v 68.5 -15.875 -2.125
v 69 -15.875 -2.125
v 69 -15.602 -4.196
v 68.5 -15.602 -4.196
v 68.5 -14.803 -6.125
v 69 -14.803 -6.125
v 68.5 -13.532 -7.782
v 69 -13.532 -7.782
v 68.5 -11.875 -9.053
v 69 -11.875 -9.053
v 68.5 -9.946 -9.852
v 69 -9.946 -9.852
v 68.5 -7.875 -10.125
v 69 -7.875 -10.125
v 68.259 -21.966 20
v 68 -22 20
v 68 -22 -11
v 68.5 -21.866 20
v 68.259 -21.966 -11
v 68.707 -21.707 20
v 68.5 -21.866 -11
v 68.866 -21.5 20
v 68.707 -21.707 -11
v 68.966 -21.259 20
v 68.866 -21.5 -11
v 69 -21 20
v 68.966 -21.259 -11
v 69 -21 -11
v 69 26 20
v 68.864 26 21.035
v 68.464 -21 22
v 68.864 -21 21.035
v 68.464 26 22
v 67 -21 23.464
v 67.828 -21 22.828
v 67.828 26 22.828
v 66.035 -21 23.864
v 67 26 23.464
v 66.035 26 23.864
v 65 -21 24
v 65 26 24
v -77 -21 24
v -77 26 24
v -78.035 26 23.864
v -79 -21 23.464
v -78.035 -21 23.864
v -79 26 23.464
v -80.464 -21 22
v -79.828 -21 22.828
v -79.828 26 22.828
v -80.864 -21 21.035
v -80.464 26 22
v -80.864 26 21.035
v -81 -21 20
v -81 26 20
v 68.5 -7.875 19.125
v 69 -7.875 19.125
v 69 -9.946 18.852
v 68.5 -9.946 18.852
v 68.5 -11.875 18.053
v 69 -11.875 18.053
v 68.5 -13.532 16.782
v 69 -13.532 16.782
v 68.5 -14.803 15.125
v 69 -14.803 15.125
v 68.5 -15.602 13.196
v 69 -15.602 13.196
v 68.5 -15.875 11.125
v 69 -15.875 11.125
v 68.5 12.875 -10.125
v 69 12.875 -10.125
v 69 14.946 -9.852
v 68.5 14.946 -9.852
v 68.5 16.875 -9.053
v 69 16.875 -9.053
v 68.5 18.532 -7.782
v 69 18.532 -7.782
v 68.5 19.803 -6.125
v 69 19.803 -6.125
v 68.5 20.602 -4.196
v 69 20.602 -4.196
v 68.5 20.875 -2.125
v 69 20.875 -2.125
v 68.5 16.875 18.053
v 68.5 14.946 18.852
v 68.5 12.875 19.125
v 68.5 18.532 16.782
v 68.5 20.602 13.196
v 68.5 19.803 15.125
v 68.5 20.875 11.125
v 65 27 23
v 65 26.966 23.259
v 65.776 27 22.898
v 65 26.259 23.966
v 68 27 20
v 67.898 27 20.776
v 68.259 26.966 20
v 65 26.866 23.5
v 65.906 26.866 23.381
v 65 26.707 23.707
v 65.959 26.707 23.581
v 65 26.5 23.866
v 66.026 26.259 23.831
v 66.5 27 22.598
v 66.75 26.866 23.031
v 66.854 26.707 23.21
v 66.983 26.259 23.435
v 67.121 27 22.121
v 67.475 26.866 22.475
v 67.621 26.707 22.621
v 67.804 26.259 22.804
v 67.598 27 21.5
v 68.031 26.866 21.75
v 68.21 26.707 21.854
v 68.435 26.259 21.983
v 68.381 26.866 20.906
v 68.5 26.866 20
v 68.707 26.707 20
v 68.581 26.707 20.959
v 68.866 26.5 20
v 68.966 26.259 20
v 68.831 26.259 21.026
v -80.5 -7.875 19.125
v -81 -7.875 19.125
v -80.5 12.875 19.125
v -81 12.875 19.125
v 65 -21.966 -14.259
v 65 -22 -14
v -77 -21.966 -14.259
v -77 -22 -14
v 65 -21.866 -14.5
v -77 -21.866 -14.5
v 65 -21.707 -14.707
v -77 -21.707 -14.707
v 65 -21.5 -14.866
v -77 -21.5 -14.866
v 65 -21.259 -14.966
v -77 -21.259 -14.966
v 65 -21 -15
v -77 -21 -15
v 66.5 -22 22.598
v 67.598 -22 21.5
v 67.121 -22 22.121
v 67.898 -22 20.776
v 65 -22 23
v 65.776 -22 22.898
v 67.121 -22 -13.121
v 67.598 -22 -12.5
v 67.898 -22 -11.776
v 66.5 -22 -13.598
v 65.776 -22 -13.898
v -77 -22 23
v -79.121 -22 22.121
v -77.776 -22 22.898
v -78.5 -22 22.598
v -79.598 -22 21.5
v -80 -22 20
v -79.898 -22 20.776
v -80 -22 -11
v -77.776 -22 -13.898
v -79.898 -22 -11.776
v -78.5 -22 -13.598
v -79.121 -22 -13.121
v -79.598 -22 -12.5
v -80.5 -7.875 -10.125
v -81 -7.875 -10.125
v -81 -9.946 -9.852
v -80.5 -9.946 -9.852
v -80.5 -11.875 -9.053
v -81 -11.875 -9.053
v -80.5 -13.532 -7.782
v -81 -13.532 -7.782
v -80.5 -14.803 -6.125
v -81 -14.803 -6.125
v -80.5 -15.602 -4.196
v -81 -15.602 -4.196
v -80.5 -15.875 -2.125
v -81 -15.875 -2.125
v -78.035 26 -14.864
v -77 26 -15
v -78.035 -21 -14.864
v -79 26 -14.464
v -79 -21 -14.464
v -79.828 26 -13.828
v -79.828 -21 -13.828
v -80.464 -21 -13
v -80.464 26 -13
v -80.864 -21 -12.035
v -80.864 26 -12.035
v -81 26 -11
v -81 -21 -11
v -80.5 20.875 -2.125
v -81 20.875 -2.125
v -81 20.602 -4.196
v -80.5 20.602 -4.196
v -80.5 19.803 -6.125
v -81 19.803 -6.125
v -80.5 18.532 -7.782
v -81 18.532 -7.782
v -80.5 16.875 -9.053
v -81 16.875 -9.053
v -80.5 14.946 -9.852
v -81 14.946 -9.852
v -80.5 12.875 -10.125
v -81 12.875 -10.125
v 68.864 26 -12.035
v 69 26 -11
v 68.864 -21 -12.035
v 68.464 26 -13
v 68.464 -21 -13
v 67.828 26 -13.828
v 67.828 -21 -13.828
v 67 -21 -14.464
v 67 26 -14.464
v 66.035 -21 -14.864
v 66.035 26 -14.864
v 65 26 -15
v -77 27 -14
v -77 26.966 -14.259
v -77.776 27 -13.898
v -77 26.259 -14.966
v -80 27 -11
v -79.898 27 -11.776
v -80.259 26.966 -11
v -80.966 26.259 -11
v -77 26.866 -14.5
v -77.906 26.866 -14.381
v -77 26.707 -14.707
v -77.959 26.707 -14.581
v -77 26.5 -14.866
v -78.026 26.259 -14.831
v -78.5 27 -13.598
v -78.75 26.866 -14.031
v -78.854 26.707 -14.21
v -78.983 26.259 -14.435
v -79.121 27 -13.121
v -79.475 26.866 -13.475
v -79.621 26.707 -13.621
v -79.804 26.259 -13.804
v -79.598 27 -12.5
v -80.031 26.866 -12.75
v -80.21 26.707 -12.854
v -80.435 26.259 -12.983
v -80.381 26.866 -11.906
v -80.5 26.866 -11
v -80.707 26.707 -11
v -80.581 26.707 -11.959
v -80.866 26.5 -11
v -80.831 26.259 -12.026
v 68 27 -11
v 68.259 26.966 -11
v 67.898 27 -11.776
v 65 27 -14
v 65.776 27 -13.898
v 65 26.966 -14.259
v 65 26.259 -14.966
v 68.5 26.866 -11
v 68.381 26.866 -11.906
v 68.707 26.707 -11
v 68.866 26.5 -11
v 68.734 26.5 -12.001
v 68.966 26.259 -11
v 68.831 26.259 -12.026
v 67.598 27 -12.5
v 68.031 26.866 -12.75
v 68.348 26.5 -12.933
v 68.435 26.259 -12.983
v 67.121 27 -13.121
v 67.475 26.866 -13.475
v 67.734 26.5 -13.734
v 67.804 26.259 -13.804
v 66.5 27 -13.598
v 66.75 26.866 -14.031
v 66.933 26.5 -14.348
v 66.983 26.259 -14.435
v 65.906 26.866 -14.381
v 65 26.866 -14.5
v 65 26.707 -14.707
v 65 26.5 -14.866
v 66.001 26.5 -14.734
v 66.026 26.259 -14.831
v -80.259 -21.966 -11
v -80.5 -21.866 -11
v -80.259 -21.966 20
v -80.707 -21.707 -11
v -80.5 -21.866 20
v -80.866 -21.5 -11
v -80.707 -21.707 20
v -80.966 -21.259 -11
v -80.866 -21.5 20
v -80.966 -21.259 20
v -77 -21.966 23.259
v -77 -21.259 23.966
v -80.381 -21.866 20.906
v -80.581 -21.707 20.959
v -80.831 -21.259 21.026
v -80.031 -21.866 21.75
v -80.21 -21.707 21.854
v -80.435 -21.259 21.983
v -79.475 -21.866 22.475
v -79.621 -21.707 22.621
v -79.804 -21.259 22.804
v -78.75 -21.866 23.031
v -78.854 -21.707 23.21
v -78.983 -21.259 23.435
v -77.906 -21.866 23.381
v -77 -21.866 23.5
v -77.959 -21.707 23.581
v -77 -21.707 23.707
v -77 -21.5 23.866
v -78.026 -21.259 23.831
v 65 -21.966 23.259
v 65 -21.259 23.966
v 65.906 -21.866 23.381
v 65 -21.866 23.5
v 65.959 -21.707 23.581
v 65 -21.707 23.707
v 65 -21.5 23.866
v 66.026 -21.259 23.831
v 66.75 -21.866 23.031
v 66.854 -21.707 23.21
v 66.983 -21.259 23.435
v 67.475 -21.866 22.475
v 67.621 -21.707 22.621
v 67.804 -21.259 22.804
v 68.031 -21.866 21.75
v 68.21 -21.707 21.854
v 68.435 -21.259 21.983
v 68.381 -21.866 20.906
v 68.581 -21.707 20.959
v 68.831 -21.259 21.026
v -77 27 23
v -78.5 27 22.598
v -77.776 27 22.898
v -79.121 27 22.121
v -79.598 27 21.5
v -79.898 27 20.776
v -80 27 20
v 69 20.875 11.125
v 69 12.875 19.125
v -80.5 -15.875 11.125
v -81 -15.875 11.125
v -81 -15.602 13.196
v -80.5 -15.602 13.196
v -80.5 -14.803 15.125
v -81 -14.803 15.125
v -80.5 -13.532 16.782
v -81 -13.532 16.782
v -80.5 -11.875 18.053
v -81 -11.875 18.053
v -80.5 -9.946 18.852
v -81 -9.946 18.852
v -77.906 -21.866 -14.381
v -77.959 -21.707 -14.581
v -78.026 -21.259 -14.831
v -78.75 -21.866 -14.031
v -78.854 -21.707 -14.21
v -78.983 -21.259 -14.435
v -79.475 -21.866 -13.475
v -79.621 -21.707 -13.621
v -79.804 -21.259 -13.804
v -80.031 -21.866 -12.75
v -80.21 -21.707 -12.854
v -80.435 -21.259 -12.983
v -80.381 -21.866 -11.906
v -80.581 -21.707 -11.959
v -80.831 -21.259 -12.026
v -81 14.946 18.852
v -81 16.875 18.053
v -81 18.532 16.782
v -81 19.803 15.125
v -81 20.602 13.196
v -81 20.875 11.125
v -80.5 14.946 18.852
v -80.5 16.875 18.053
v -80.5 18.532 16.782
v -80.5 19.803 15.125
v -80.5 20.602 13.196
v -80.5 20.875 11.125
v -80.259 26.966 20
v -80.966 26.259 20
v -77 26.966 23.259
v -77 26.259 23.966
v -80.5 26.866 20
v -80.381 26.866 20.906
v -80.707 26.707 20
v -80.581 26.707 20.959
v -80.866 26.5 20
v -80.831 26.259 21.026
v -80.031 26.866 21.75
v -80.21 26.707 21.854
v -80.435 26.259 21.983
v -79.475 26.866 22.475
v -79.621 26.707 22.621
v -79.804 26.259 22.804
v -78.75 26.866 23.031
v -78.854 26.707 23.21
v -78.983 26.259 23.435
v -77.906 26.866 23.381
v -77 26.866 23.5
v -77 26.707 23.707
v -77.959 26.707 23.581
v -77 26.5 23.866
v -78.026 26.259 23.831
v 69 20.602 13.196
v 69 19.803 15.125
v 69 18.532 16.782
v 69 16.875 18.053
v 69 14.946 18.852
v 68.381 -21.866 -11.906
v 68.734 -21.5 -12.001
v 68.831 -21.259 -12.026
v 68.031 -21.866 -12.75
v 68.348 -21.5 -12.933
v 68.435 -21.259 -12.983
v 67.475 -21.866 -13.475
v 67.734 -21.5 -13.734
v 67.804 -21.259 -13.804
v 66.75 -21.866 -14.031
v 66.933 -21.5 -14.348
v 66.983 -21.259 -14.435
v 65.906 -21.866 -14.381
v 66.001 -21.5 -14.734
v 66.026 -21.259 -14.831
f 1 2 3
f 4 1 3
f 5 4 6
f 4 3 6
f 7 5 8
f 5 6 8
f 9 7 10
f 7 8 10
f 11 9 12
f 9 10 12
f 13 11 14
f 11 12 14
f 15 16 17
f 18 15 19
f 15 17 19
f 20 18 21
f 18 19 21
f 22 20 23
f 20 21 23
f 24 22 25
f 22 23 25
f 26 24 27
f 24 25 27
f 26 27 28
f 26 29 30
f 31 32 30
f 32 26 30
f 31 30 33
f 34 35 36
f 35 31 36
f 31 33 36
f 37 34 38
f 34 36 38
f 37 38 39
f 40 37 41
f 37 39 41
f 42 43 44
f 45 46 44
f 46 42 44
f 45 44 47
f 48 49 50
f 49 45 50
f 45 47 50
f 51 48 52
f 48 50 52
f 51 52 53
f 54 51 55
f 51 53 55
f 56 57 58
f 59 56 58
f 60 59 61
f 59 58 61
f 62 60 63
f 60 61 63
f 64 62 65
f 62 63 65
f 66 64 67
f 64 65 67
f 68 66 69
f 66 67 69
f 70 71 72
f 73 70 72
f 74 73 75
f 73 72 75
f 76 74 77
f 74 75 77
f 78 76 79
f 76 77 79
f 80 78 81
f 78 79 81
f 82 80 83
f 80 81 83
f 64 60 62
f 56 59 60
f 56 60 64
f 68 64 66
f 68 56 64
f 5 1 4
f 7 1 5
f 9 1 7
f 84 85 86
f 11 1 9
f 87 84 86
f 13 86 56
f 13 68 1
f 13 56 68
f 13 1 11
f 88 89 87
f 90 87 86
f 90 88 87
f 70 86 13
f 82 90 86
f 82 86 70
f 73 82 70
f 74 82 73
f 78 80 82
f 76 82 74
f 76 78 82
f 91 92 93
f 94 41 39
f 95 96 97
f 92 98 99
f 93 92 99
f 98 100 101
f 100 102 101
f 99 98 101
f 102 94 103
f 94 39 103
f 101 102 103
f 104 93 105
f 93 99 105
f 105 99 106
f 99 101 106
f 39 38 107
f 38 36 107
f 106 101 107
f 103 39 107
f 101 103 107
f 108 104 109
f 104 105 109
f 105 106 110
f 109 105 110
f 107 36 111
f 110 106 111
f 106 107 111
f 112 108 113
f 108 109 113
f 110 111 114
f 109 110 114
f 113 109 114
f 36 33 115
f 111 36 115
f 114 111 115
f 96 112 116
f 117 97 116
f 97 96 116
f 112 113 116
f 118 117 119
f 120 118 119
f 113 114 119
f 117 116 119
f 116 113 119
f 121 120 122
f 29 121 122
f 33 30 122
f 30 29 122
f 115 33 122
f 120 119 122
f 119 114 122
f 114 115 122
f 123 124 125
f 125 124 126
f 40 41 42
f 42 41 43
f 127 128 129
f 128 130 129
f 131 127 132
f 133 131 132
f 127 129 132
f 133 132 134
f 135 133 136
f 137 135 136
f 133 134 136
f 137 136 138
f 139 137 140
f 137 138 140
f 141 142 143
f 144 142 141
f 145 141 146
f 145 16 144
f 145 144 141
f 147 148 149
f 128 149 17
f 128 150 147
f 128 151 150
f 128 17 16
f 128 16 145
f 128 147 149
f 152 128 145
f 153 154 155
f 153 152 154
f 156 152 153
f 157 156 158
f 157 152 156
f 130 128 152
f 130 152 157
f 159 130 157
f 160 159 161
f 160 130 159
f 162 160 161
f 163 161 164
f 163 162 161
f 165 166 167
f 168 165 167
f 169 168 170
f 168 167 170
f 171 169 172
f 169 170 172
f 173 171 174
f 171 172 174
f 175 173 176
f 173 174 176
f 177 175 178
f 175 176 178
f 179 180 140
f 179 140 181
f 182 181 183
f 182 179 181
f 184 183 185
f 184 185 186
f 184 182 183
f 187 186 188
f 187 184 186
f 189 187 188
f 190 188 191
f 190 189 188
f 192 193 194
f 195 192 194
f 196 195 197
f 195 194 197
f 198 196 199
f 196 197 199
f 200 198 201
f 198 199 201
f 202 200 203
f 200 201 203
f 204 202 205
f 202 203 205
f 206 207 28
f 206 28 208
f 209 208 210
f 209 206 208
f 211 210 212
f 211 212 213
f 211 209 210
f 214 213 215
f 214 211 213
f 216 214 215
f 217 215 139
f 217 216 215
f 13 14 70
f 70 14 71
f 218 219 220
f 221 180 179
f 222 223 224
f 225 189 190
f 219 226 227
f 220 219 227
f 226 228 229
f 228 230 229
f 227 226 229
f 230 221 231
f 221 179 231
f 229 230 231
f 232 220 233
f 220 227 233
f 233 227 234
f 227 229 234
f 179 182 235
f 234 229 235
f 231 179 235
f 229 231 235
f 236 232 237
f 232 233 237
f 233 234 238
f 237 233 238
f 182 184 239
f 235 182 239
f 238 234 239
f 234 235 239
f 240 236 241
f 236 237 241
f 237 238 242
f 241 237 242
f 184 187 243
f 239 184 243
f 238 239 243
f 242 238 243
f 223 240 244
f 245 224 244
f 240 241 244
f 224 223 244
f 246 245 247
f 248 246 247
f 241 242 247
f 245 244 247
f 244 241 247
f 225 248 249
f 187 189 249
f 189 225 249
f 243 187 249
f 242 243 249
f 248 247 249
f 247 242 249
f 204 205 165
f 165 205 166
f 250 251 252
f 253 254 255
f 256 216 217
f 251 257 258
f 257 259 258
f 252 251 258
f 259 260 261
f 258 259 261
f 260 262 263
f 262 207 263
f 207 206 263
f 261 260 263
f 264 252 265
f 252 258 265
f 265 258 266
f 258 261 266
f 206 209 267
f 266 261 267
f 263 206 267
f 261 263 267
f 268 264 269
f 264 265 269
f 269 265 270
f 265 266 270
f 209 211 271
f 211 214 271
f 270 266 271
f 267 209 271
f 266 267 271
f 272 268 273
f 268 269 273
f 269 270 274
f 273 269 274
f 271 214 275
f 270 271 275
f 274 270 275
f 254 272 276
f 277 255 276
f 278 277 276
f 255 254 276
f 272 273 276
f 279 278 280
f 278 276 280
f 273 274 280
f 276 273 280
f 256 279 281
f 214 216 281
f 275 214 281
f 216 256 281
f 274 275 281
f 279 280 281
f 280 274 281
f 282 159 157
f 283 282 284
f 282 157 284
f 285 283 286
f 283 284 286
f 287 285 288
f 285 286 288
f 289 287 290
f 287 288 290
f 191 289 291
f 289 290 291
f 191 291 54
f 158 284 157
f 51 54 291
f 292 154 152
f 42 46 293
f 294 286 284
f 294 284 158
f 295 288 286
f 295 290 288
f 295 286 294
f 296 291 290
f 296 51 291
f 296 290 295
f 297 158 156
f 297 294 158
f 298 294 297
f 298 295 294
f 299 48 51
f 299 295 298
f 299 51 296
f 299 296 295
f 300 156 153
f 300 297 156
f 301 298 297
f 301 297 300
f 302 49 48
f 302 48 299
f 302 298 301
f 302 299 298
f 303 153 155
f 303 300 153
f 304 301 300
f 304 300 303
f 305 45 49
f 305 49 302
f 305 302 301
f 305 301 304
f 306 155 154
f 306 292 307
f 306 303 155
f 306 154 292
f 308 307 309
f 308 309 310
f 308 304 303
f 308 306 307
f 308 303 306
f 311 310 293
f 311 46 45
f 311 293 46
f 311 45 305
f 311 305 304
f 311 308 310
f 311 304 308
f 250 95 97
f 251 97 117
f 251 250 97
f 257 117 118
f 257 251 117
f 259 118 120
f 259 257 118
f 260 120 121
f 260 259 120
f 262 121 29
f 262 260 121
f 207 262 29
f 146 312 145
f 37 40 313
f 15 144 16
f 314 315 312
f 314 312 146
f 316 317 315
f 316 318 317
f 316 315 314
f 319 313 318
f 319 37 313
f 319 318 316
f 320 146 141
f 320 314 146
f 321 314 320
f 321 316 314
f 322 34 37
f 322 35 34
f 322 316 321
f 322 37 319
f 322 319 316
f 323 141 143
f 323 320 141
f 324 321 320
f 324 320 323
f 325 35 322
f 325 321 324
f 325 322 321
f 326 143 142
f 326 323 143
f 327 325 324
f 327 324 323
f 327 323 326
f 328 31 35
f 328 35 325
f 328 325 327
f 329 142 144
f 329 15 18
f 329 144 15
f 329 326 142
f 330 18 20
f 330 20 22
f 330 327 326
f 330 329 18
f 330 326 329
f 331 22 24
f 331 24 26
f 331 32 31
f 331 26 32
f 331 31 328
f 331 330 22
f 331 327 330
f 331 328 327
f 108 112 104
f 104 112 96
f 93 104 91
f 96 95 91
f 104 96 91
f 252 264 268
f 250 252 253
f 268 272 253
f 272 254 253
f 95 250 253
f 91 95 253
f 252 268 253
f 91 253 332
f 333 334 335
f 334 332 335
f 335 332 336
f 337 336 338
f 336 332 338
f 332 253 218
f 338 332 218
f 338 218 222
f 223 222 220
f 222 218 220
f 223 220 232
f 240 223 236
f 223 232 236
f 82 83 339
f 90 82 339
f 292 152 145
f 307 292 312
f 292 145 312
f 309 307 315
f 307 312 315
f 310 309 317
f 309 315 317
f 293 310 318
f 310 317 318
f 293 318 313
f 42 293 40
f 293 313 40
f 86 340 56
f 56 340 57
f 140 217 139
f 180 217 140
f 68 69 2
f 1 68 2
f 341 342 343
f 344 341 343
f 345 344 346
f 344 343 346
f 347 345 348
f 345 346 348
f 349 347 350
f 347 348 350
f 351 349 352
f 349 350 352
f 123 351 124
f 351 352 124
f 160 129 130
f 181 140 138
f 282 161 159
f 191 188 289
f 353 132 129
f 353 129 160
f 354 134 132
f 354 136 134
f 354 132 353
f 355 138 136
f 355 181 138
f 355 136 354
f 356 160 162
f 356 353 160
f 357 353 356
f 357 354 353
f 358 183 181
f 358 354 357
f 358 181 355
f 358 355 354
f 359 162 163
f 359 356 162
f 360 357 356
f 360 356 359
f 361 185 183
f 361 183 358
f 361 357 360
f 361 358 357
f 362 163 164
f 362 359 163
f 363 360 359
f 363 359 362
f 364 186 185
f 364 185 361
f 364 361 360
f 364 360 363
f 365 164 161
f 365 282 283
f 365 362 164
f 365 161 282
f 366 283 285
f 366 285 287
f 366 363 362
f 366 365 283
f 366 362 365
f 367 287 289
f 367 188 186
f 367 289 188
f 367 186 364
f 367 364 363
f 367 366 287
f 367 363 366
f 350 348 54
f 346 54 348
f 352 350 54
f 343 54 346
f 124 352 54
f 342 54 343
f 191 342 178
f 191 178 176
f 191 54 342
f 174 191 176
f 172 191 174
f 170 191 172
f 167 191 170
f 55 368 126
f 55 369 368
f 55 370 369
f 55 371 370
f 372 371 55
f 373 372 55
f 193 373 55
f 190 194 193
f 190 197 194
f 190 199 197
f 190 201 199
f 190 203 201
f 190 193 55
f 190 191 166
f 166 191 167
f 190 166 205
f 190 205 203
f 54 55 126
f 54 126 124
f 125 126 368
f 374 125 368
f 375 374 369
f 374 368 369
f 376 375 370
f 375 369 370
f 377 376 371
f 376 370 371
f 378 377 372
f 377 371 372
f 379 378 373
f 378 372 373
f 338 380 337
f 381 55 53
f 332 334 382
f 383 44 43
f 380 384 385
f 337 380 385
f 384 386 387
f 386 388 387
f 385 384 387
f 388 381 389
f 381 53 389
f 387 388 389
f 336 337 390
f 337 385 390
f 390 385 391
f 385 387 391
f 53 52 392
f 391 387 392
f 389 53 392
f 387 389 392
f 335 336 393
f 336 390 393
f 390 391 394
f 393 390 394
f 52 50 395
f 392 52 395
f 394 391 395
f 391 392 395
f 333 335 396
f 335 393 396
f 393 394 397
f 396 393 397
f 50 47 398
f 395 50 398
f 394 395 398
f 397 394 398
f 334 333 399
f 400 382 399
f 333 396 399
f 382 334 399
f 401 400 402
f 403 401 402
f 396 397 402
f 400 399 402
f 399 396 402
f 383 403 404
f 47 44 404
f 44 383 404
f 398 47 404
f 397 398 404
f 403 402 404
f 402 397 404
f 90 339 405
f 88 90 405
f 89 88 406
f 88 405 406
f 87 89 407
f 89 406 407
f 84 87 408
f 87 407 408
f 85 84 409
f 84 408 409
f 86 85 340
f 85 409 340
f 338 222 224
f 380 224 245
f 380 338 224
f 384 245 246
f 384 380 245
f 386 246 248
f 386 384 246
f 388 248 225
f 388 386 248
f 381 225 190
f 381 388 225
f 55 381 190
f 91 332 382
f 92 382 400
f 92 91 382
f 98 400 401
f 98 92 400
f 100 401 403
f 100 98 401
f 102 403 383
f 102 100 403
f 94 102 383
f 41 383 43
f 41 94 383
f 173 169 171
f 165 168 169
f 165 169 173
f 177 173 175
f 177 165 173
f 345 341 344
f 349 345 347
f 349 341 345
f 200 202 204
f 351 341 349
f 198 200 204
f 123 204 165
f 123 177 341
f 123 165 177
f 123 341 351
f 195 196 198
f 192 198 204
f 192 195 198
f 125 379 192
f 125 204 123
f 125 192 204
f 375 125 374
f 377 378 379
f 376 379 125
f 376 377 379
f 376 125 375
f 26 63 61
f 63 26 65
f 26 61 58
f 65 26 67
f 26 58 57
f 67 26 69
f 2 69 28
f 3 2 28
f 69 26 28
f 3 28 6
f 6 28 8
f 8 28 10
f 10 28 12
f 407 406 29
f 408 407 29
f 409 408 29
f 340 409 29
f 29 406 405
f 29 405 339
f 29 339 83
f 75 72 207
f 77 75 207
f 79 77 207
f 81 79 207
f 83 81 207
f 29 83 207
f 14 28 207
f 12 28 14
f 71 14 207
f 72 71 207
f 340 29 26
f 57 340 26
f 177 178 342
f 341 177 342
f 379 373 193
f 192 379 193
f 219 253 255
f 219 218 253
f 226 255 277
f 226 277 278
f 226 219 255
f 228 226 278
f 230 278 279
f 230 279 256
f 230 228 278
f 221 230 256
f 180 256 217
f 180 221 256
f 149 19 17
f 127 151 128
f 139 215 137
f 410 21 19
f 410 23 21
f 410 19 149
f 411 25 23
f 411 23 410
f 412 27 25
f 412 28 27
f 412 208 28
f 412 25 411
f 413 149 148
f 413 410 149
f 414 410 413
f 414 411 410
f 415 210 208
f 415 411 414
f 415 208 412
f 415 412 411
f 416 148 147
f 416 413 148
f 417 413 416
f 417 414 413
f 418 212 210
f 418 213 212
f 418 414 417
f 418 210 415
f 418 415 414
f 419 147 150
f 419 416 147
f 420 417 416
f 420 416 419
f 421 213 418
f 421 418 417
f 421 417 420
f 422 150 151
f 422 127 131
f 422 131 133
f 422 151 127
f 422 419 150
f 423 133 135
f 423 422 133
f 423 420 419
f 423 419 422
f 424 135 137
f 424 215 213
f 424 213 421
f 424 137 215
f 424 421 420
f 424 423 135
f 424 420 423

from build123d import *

# Parameters (mm, degrees)
SKETCH1_W           = 150
SKETCH1_H           = 49
BOSS_EXTRUDE1_DEPTH = 39
CUT_EXTRUDE1_DEPTH  = 0.5
CUT_EXTRUDE2_DEPTH  = 0.5
FILLET1_R           = 4
FILLET2_R           = 1


with BuildPart() as part:
    # Sketch1 → Boss-Extrude1 (new body)
    with BuildSketch(Plane(origin=(0, 0, -15), x_dir=(-1, 0, 0), z_dir=(0, 0, -1))):
        with Locations((6, 2.5)):
            Rectangle(SKETCH1_W, SKETCH1_H)
    extrude(amount=-BOSS_EXTRUDE1_DEPTH)

    # Sketch2 → Cut-Extrude1 (cut)
    with BuildSketch(Plane(origin=(69, 0, 0), x_dir=(0, 0, -1), z_dir=(1, 0, 0))):
        with BuildLine():
            Line((-19.125, 12.875), (-19.125, -7.875))
            ThreePointArc((-19.125, -7.875), (-16.781854249, -13.531854249), (-11.125, -15.875))
            Line((-11.125, -15.875), (2.125, -15.875))
            ThreePointArc((2.125, -15.875), (7.781854249, -13.531854249), (10.125, -7.875))
            Line((10.125, -7.875), (10.125, 12.875))
            ThreePointArc((10.125, 12.875), (7.781854249, 18.531854249), (2.125, 20.875))
            Line((2.125, 20.875), (-11.125, 20.875))
            ThreePointArc((-11.125, 20.875), (-16.781854249, 18.531854249), (-19.125, 12.875))
        make_face()
    extrude(amount=-CUT_EXTRUDE1_DEPTH, mode=Mode.SUBTRACT)

    # Sketch3 → Cut-Extrude2 (cut)
    with BuildSketch(Plane.ZY.offset(81)):
        with BuildLine():
            Line((11.125, 20.875), (-2.125, 20.875))
            ThreePointArc((-2.125, 20.875), (-7.781854249, 18.531854249), (-10.125, 12.875))
            Line((-10.125, 12.875), (-10.125, -7.875))
            ThreePointArc((-10.125, -7.875), (-7.781854249, -13.531854249), (-2.125, -15.875))
            Line((-2.125, -15.875), (11.125, -15.875))
            ThreePointArc((11.125, -15.875), (16.781854249, -13.531854249), (19.125, -7.875))
            Line((19.125, -7.875), (19.125, 12.875))
            ThreePointArc((19.125, 12.875), (16.781854249, 18.531854249), (11.125, 20.875))
        make_face()
    extrude(amount=-CUT_EXTRUDE2_DEPTH, mode=Mode.SUBTRACT)

    # Fillet1
    fillet1_edges = [part.edges().sort_by_distance(p)[0] for p in [
        (-81, 2.5, 24),
        (69, 2.5, 24),
        (-81, 2.5, -15),
        (69, 2.5, -15),
    ]]
    fillet(fillet1_edges, radius=FILLET1_R)

    # Fillet2
    fillet2_edges = [part.edges().sort_by_distance(p)[0] for p in [
        (-6, -22, -15),
        (-6, 27, -15),
        (-81, 27, 4.5),
        (-6, 27, 24),
        (69, 27, 4.5),
        (67.828427125, 27, 22.828427125),
        (67.828427125, 27, -13.828427125),
        (-79.828427125, 27, 22.828427125),
        (-79.828427125, 27, -13.828427125),
        (-81, -22, 4.5),
        (69, -22, 4.5),
        (-6, -22, 24),
        (67.828427125, -22, 22.828427125),
        (67.828427125, -22, -13.828427125),
        (-79.828427125, -22, 22.828427125),
        (-79.828427125, -22, -13.828427125),
    ]]
    fillet(fillet2_edges, radius=FILLET2_R)


solid = part.part
